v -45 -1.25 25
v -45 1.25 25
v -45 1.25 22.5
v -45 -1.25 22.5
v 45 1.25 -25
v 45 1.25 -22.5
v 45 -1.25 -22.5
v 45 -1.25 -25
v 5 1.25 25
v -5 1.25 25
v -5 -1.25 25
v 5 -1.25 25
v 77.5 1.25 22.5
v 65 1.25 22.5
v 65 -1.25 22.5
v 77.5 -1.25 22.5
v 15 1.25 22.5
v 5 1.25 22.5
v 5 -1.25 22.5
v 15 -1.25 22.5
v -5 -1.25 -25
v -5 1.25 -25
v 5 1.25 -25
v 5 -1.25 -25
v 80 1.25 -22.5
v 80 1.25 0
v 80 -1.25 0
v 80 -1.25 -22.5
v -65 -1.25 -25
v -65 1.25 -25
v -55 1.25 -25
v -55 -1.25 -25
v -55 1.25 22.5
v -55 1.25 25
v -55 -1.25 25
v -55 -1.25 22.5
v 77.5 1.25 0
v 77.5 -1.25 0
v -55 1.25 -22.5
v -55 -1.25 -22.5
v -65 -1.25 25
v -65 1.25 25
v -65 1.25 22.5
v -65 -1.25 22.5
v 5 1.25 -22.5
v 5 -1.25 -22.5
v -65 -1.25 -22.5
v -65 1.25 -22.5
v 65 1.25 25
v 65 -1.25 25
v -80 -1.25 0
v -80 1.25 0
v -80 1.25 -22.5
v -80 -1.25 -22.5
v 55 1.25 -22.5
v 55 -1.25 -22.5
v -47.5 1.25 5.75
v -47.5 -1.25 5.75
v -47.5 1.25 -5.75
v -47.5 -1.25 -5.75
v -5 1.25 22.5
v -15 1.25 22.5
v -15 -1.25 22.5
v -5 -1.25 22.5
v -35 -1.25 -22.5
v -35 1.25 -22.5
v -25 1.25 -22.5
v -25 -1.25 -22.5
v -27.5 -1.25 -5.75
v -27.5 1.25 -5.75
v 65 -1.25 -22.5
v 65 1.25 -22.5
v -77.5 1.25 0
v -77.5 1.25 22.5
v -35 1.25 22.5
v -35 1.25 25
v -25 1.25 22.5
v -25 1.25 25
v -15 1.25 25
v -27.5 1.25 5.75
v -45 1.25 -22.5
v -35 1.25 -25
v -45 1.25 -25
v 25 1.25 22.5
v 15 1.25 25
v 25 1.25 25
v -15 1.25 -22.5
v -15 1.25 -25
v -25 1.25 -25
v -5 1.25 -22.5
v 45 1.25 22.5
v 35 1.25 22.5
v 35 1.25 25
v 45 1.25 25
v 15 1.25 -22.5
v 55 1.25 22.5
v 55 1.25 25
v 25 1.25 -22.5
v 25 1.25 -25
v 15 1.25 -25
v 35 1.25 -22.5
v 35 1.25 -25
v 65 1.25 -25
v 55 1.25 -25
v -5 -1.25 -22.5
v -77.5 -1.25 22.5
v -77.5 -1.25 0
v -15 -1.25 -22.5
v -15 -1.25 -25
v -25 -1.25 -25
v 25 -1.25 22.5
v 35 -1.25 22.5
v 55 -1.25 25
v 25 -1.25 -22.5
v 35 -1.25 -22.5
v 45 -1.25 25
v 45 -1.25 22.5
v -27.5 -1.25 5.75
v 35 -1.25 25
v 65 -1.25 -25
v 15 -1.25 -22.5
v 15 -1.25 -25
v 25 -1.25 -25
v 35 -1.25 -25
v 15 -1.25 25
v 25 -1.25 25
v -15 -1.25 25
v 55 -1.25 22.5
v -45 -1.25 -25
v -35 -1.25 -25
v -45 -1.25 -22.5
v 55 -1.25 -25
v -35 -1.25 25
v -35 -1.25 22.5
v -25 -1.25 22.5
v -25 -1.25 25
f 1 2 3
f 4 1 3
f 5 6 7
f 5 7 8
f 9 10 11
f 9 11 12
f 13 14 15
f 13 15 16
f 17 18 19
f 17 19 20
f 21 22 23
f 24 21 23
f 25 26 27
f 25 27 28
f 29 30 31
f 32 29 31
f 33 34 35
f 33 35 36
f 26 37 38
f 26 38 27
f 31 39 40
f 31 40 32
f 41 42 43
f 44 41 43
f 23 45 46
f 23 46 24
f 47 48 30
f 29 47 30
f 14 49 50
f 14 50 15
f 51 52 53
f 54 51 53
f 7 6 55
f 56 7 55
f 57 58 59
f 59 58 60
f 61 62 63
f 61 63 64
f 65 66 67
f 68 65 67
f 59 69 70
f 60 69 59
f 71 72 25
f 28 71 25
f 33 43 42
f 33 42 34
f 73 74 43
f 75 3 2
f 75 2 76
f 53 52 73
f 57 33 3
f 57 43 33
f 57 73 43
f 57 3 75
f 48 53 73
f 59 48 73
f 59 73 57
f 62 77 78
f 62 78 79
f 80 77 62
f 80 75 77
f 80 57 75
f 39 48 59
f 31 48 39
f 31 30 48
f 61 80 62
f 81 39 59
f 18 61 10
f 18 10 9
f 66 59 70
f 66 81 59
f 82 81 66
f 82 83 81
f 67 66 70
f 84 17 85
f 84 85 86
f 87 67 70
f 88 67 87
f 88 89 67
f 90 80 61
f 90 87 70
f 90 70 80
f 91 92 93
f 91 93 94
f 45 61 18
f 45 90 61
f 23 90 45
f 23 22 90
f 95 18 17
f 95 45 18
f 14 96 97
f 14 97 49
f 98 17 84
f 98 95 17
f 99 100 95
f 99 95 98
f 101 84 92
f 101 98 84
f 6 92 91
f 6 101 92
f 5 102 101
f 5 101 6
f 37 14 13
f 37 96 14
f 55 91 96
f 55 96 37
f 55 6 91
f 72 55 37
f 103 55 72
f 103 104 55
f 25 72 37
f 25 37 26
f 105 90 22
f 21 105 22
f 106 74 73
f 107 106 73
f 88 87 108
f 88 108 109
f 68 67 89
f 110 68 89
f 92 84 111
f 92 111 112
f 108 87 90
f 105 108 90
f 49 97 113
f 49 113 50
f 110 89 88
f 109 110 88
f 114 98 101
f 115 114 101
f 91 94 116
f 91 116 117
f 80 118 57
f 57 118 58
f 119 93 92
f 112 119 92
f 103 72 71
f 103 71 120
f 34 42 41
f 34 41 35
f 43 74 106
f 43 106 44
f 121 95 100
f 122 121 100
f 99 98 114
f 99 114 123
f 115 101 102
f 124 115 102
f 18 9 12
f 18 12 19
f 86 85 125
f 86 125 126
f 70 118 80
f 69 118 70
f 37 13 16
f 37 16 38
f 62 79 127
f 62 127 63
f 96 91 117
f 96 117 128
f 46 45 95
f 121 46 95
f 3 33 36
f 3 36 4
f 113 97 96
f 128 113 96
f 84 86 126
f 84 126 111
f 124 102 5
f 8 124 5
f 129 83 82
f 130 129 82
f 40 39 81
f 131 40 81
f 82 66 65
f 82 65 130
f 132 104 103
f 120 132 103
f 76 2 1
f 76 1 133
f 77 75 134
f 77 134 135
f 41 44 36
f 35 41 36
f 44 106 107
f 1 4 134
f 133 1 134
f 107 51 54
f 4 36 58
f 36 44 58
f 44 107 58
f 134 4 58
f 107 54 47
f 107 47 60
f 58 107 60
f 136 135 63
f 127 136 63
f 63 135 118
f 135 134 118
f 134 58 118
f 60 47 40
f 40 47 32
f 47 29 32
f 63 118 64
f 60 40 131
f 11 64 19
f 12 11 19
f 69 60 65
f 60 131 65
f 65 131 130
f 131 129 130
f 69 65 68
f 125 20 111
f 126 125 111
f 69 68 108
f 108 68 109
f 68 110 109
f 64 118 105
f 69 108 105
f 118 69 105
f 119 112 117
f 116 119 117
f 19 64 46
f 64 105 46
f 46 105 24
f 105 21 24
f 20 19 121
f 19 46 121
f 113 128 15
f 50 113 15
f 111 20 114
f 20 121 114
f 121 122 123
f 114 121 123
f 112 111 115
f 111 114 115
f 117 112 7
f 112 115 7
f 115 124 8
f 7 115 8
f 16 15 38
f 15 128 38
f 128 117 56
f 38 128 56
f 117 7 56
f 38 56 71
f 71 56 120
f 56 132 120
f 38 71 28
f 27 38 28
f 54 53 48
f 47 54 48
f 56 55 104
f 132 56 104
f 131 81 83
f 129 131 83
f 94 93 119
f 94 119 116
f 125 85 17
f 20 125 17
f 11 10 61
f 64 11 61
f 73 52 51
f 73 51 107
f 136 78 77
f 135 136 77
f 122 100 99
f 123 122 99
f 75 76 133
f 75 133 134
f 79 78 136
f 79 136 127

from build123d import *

# Parameters (mm, degrees)
SKETCH1_W           = 160
SKETCH1_H           = 50
BOSS_EXTRUDE1_DEPTH = 1.25
SKETCH2_W           = 10
SKETCH2_H           = 2.5
SKETCH2_W_2         = 15
CUT_EXTRUDE1_DEPTH  = 4
SKETCH3_W           = 2.5
SKETCH3_H           = 22.5
CUT_EXTRUDE2_DEPTH  = 84.852549156
CUT_EXTRUDE3_REACH  = 85.853
SKETCH4_W           = 20
SKETCH4_H           = 11.5


with BuildPart() as part:
    # Sketch1 → Boss-Extrude1 (new, symmetric)
    with BuildSketch(Plane(origin=(0, 0, 0), x_dir=(1, 0, 0), z_dir=(0, 1, 0))):
        Rectangle(SKETCH1_W, SKETCH1_H)
    extrude(amount=BOSS_EXTRUDE1_DEPTH, both=True)

    # Sketch2 → Cut-Extrude1 (cut)
    with BuildSketch(Plane(origin=(0, 1.25, 0), x_dir=(1, 0, 0), z_dir=(0, 1, 0))):
        with Locations((30, 23.75)):
            Rectangle(SKETCH2_W, SKETCH2_H)
        with Locations((10, 23.75)):
            Rectangle(SKETCH2_W, SKETCH2_H)
        with Locations((10, -23.75)):
            Rectangle(SKETCH2_W, SKETCH2_H)
        with Locations((30, -23.75)):
            Rectangle(SKETCH2_W, SKETCH2_H)
        with Locations((50, 23.75)):
            Rectangle(SKETCH2_W, SKETCH2_H)
        with Locations((50, -23.75)):
            Rectangle(SKETCH2_W, SKETCH2_H)
        with Locations((-10, 23.75)):
            Rectangle(SKETCH2_W, SKETCH2_H)
        with Locations((-10, -23.75)):
            Rectangle(SKETCH2_W, SKETCH2_H)
        with Locations((-30, 23.75)):
            Rectangle(SKETCH2_W, SKETCH2_H)
        with Locations((-30, -23.75)):
            Rectangle(SKETCH2_W, SKETCH2_H)
        with Locations((-50, 23.75)):
            Rectangle(SKETCH2_W, SKETCH2_H)
        with Locations((-50, -23.75)):
            Rectangle(SKETCH2_W, SKETCH2_H)
        with Locations((72.5, 23.75)):
            Rectangle(SKETCH2_W_2, SKETCH2_H)
        with Locations((72.5, -23.75)):
            Rectangle(SKETCH2_W_2, SKETCH2_H)
        with Locations((-72.5, 23.75)):
            Rectangle(SKETCH2_W_2, SKETCH2_H)
        with Locations((-72.5, -23.75)):
            Rectangle(SKETCH2_W_2, SKETCH2_H)
    extrude(amount=-CUT_EXTRUDE1_DEPTH, mode=Mode.SUBTRACT)

    # Sketch3 → Cut-Extrude2 (cut, through all)
    with BuildSketch(Plane(origin=(0, 1.25, 0), x_dir=(1, 0, 0), z_dir=(0, 1, 0))):
        with Locations((78.75, -11.25)):
            Rectangle(SKETCH3_W, SKETCH3_H)
        with Locations((-78.75, -11.25)):
            Rectangle(SKETCH3_W, SKETCH3_H)
    extrude(amount=-CUT_EXTRUDE2_DEPTH, mode=Mode.SUBTRACT)

    # Sketch4 → Cut-Extrude3 (cut, up to next)
    with BuildSketch(Plane(origin=(0, -1.25, 0), x_dir=(-1, 0, 0), z_dir=(0, -1, 0)), mode=Mode.PRIVATE) as cut_extrude3_sk1:
        with Locations((37.5, 0)):
            Rectangle(SKETCH4_W, SKETCH4_H)
    cut_extrude3_tool1 = extrude(cut_extrude3_sk1.sketch, amount=-CUT_EXTRUDE3_REACH, mode=Mode.PRIVATE) & part.part
    add(cut_extrude3_tool1.solids().sort_by_distance((-37.5, -1.25, 0))[0], mode=Mode.SUBTRACT)


solid = part.part
